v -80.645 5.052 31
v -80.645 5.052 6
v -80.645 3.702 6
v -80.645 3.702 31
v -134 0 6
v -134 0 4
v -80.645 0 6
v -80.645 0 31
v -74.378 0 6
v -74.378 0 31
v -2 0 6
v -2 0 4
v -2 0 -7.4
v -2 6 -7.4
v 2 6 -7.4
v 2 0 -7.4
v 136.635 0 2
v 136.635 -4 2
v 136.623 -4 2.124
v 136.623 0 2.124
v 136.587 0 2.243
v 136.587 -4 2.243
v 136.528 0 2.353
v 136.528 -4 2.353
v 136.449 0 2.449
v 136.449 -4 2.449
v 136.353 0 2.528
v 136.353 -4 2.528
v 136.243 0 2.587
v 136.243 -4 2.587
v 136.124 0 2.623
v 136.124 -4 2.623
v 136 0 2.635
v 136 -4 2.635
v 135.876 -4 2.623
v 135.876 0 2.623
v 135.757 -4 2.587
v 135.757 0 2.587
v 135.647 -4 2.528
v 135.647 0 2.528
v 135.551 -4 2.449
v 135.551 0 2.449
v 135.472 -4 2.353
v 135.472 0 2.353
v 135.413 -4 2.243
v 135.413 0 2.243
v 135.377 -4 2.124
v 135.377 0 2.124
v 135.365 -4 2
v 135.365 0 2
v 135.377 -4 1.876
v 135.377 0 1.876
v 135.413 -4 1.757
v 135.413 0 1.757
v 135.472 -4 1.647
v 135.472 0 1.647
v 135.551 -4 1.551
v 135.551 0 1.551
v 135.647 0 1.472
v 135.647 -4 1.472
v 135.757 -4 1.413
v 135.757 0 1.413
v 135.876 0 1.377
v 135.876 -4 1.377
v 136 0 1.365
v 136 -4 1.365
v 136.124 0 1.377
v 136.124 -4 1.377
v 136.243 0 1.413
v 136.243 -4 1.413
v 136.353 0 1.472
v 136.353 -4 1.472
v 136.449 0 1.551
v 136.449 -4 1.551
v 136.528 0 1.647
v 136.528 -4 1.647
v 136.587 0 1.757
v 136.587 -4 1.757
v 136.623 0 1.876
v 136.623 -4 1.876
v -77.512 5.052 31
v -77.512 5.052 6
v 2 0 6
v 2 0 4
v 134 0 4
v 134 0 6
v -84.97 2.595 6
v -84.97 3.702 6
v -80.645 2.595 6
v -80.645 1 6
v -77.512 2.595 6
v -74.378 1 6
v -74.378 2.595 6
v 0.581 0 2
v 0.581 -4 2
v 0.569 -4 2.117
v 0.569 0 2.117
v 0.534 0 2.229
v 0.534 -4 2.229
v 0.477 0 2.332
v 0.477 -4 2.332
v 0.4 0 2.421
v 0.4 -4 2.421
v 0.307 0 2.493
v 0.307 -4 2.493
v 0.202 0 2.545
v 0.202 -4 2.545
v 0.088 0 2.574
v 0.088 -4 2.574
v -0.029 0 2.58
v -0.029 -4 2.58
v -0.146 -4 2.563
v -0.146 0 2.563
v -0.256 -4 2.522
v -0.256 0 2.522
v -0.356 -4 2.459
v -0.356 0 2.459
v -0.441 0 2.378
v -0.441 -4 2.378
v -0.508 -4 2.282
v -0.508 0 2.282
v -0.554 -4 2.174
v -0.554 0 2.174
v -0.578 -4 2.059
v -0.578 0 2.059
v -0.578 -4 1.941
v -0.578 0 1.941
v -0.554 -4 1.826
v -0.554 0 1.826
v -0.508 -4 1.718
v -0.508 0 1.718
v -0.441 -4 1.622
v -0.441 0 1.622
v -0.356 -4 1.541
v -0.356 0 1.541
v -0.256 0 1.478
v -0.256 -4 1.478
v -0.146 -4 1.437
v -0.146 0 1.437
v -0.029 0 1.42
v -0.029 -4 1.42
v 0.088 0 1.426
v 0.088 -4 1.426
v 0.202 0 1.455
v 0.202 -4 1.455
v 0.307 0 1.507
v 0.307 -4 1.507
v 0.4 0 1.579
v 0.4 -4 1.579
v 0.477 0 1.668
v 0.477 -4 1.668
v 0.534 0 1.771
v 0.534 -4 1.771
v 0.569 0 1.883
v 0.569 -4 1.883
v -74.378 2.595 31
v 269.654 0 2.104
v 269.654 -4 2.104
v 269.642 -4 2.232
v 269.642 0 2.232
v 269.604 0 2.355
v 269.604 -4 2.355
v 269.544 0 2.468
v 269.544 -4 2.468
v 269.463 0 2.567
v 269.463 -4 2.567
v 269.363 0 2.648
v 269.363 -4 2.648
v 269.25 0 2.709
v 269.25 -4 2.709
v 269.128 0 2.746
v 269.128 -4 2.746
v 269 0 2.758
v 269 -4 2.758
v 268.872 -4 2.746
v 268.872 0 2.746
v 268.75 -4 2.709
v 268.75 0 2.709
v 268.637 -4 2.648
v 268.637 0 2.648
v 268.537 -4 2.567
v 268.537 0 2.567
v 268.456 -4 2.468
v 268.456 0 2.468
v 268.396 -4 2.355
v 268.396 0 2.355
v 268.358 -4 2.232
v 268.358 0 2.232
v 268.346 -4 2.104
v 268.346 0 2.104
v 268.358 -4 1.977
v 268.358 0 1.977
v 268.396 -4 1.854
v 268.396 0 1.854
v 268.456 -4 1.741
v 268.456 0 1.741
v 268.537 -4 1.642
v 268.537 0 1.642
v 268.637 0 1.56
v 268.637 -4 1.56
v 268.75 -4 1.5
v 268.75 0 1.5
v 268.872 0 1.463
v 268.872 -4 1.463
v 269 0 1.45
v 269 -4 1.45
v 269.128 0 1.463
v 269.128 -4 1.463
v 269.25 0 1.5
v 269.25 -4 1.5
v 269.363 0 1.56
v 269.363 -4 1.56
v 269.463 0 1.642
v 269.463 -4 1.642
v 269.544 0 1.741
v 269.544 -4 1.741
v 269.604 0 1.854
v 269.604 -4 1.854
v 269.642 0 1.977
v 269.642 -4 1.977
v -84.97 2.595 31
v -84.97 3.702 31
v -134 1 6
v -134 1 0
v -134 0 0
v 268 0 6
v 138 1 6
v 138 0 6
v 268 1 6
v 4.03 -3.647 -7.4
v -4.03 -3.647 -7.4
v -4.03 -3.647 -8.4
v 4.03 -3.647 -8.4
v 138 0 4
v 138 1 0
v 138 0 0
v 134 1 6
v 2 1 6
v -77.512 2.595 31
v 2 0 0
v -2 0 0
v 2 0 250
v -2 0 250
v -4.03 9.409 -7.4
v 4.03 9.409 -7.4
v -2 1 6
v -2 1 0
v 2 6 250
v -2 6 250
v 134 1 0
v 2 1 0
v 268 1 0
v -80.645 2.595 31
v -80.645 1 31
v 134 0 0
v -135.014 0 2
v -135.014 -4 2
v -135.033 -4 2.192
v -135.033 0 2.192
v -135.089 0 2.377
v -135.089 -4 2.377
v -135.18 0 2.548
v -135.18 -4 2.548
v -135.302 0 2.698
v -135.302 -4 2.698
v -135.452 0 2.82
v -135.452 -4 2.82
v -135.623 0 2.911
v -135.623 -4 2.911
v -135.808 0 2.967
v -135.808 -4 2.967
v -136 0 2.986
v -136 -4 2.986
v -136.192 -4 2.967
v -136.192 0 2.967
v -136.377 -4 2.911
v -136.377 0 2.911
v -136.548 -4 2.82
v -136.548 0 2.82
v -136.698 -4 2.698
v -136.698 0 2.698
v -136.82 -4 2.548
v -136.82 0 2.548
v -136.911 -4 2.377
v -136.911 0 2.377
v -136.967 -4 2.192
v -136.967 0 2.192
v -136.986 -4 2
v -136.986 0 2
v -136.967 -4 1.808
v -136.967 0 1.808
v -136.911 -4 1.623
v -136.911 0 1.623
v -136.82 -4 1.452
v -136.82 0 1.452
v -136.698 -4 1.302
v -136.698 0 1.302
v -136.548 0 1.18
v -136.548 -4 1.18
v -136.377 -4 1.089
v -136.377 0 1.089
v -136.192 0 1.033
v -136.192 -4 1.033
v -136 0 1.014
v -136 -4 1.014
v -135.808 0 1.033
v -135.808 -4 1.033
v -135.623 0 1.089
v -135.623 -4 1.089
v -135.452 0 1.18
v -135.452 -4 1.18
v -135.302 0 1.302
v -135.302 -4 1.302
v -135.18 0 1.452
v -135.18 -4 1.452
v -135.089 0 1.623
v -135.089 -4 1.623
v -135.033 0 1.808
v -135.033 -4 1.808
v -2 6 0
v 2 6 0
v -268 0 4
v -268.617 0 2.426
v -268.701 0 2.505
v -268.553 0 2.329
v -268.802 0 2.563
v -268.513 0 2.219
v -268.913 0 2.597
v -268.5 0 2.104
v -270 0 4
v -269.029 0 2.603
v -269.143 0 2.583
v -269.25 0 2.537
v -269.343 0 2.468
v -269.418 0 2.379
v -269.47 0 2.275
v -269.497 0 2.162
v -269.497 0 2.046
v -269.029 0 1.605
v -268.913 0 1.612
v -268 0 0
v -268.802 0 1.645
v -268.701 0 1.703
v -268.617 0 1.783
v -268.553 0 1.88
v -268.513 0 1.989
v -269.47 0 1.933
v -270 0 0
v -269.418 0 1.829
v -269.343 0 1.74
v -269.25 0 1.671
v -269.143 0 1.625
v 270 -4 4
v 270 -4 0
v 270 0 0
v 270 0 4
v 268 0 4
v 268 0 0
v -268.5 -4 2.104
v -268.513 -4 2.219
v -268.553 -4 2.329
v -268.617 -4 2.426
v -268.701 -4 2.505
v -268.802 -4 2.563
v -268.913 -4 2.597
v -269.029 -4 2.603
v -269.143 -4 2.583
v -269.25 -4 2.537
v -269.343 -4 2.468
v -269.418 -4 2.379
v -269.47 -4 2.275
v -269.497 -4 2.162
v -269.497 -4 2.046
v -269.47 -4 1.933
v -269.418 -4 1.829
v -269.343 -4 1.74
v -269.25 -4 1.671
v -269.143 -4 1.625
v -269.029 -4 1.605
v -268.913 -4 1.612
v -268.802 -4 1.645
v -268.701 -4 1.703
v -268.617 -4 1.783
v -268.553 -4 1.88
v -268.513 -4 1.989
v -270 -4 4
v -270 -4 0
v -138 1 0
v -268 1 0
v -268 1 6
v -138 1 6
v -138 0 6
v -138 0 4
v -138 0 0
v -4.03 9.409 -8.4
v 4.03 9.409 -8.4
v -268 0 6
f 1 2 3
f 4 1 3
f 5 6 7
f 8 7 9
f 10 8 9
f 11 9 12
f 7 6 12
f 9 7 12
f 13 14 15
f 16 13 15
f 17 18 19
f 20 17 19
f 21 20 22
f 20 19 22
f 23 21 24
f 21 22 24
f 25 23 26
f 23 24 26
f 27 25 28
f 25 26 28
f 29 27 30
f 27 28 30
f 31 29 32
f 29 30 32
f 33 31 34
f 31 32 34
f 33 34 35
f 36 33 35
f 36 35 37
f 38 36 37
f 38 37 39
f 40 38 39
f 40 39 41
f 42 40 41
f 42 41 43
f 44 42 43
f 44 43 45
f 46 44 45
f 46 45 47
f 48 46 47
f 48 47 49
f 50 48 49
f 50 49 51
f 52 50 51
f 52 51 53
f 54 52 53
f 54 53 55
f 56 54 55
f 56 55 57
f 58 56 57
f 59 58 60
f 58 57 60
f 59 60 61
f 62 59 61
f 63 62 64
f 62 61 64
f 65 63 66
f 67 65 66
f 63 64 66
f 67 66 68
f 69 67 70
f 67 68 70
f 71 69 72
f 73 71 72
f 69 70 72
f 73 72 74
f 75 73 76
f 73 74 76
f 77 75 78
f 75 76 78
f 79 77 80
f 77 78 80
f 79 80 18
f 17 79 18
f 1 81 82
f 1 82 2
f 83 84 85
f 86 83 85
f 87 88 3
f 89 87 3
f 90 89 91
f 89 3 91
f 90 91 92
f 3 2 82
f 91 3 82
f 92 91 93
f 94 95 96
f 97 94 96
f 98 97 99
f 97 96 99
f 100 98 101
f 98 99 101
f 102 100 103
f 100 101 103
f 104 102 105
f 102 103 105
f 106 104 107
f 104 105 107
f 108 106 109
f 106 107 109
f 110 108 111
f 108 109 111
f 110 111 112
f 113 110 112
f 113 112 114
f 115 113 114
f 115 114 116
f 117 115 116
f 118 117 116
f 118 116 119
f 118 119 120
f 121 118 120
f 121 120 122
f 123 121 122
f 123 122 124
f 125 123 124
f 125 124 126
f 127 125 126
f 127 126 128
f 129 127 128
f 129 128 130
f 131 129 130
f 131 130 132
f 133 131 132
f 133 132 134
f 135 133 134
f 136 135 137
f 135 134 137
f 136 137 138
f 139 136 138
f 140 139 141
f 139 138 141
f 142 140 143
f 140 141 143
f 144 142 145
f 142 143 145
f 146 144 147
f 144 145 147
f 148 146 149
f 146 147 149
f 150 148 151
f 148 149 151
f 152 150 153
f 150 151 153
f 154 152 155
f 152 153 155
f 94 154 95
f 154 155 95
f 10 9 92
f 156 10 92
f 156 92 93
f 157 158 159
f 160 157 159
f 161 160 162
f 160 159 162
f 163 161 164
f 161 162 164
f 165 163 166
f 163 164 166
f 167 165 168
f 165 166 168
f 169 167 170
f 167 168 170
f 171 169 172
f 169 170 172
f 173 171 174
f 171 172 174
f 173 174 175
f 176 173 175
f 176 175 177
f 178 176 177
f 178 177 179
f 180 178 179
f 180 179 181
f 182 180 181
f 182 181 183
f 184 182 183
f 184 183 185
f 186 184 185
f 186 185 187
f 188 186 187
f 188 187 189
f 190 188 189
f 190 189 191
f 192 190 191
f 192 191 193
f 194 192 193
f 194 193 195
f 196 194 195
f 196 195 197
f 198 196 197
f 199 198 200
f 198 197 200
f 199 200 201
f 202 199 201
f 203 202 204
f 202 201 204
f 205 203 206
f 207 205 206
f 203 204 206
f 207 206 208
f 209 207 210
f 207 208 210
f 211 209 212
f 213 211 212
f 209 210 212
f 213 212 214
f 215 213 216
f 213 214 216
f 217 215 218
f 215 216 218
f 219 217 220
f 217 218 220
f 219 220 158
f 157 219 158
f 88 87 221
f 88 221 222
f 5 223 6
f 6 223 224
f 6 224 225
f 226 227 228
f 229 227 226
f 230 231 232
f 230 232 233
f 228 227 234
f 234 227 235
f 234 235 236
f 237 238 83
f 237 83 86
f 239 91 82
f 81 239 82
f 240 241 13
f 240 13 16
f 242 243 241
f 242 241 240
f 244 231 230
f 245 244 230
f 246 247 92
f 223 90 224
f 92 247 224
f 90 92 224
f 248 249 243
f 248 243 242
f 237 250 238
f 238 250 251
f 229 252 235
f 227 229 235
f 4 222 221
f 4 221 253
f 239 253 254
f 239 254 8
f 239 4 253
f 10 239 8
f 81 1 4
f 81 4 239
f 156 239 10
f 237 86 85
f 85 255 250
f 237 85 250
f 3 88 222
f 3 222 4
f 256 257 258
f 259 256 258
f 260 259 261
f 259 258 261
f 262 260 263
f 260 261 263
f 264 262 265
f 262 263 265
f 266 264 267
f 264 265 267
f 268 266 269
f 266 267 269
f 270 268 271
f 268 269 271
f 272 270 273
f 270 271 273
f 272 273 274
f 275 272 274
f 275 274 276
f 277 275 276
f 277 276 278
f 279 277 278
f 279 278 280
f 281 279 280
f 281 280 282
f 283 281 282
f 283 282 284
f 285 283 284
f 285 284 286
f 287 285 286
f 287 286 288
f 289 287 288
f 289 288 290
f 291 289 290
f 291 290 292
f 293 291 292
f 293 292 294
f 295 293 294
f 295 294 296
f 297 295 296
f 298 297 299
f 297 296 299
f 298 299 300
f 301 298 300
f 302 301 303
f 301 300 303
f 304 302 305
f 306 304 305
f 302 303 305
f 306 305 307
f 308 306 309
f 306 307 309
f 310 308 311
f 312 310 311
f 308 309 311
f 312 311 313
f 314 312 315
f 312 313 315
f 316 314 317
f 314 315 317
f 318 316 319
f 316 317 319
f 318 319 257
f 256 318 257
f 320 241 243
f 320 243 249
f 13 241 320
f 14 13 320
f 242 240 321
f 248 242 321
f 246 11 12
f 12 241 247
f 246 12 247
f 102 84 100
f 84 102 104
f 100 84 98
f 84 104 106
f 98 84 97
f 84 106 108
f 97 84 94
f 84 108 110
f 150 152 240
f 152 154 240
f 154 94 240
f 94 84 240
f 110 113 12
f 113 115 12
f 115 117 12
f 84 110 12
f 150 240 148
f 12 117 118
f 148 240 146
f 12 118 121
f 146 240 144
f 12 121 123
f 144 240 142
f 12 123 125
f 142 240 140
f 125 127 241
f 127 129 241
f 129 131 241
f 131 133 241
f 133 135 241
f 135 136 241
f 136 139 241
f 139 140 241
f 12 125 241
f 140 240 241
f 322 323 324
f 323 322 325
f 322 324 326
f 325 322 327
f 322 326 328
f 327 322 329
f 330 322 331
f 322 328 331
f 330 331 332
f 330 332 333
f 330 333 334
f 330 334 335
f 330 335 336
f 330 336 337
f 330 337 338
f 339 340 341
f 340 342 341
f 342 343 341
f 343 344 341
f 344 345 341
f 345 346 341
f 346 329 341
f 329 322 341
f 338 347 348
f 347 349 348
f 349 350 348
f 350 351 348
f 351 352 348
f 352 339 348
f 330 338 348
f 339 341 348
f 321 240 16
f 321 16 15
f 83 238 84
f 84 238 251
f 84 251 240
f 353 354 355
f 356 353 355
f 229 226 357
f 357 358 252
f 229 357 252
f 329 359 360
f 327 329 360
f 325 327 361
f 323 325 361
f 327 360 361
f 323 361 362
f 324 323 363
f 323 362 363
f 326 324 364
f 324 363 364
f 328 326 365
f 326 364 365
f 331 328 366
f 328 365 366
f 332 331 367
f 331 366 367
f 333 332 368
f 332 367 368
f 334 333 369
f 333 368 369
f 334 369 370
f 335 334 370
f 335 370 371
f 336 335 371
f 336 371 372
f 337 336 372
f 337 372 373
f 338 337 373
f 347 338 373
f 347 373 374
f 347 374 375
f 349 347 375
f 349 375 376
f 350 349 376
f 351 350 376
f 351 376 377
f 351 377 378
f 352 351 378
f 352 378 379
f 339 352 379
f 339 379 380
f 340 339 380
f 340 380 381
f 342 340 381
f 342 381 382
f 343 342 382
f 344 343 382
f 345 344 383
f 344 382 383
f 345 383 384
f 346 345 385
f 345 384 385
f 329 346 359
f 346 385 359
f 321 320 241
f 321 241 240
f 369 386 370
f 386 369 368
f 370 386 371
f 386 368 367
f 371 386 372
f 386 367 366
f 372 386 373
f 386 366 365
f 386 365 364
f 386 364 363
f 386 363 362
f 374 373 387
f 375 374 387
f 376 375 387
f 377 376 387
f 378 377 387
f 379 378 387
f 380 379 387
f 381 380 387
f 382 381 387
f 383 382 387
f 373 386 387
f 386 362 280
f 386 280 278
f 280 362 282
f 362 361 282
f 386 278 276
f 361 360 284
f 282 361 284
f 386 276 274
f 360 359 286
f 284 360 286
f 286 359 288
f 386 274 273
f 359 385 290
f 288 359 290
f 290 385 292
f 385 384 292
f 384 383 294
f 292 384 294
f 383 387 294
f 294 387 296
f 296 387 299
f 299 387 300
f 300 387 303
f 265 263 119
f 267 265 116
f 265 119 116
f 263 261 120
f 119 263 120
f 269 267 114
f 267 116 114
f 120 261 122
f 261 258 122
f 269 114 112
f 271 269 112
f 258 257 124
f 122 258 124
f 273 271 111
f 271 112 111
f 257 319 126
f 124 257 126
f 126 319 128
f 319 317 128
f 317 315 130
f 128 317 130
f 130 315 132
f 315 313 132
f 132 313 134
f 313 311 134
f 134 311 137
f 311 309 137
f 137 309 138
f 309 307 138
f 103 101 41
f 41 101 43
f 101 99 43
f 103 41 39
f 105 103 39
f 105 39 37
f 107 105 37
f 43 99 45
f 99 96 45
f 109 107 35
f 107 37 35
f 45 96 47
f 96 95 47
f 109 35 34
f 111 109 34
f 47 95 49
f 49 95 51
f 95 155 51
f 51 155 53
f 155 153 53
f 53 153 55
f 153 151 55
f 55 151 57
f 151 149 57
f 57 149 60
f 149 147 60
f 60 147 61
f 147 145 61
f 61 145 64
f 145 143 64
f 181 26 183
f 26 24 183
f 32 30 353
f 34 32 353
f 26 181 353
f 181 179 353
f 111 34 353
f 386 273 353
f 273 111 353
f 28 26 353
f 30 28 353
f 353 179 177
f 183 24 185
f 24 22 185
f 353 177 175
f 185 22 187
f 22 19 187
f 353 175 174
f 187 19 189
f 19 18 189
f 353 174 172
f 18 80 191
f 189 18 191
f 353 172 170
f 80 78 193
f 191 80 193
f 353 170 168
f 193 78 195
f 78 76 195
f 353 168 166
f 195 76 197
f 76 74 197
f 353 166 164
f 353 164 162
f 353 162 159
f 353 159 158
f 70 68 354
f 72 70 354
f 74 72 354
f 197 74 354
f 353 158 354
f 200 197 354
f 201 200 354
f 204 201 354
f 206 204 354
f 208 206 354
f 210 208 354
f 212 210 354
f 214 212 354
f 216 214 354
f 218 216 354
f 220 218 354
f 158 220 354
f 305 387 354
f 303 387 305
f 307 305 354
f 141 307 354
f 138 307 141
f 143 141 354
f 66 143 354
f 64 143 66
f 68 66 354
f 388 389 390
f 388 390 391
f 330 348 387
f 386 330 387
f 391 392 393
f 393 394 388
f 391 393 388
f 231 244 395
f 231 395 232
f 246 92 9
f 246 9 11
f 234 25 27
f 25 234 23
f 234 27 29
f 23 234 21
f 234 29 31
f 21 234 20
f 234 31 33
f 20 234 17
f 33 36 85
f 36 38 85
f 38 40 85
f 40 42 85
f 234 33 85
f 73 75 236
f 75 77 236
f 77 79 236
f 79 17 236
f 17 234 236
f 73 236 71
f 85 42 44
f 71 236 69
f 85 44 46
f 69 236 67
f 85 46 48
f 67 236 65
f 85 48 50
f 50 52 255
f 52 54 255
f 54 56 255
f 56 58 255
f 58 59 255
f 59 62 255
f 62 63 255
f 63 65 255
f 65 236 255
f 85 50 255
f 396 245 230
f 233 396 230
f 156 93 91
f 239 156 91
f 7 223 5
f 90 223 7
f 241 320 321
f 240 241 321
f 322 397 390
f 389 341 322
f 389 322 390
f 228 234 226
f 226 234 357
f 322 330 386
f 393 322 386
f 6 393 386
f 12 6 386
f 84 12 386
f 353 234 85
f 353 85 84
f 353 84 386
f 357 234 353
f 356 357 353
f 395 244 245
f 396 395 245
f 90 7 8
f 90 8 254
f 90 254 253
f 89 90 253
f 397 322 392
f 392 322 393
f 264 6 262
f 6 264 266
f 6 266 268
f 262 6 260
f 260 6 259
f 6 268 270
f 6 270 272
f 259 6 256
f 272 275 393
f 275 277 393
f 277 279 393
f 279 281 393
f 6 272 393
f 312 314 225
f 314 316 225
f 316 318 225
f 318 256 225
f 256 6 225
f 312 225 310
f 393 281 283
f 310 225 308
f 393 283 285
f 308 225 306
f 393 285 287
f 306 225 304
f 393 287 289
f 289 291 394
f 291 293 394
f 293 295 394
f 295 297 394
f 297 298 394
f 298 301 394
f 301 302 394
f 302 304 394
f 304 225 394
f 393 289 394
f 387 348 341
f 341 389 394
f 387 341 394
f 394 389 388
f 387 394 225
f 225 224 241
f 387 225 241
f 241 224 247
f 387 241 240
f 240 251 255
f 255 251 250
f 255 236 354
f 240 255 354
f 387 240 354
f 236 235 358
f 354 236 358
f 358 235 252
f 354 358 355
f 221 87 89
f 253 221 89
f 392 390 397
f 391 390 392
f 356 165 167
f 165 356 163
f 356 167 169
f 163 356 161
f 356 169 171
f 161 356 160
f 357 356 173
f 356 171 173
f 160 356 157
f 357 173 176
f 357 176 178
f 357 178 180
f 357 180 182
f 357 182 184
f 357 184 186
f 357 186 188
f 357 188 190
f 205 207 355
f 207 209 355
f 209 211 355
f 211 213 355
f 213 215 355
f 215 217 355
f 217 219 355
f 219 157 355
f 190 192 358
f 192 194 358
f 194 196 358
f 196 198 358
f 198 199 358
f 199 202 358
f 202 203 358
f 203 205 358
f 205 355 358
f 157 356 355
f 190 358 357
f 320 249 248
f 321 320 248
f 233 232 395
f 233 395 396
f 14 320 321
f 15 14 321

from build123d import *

# Parameters (mm, degrees)
F1_DEPTH  = 4
F2_W      = 130
F2_H      = 1
F2_W_2    = 132
F3_DEPTH  = 2
F4_R      = 0.5
F4_R_2    = 0.9864532669
F4_R_3    = 0.58106253
F4_R_4    = 0.6541784485
F4_R_5    = 0.6351490428
F5_DEPTH  = 6.3
F6_W      = 4
F6_H      = 6
F7_DEPTH  = 250
F8_DEPTH  = 7.4
F9_W      = 8.0595696345
F9_H      = 13.0560852122
F9_W_2    = 4
F9_H_2    = 6
F10_DEPTH = 1
F11_W     = 3.1334906816
F11_H     = 1.5953846052
F11_W_2   = 4.3241381645
F11_H_2   = 1.1064866558
F12_DEPTH = 25


with BuildPart() as f1:
    # F0 (on Top) → F1 (new body)
    with BuildSketch(Plane.XY):
        Polygon((-268, 0), (-270, 0), (-270, -4), (270, -4), (270, 0), (268, 0), (268, 1), (138, 1), (138, 0), (134, 0), (134, 1), (2, 1), (2, 0), (-2, 0), (-2, 1), (-134, 1), (-134, 0), (-138, 0), (-138, 1), (-268, 1), align=None)
    extrude(amount=F1_DEPTH)

    # F2 (on face) → F3 (join)
    with BuildSketch(Plane.XY.offset(4)):
        with Locations((-203, 0.5)):
            Rectangle(F2_W, F2_H)
        with Locations((-68, 0.5)):
            Rectangle(F2_W_2, F2_H)
        with Locations((68, 0.5)):
            Rectangle(F2_W_2, F2_H)
        with Locations((203, 0.5)):
            Rectangle(F2_W, F2_H)
    extrude(amount=F3_DEPTH)

    # F4 (on face) → F5 (cut)
    with BuildSketch(Plane.XZ.offset(4)):
        with Locations((-269, 2.1041841583)):
            Circle(F4_R)
        with Locations((-136, 2)):
            Circle(F4_R_2)
        with Locations((0, 2)):
            Circle(F4_R_3)
        with Locations((269, 2.1041841583)):
            Circle(F4_R_4)
        with Locations((136, 2)):
            Circle(F4_R_5)
    extrude(amount=-F5_DEPTH, mode=Mode.SUBTRACT)

    # F11 (on face) → F12 (join)
    with BuildSketch(Plane.XY.offset(6)):
        Polygon((-74.3784606457, 0), (-74.3784606457, 2.5953846052), (-77.5119513273, 2.5953846052), (-77.5119513273, 1), (-80.645442009, 1), (-80.645442009, 0), align=None)
        with Locations((-79.0786966681, 1.7976923026)):
            Rectangle(F11_W, F11_H)
        Polygon((-80.645442009, 2.5953846052), (-77.5119513273, 2.5953846052), (-77.5119513273, 5.0517162308), (-80.645442009, 5.0517162308), (-80.645442009, 3.701871261), align=None)
        with Locations((-82.8075110912, 3.1486279331)):
            Rectangle(F11_W_2, F11_H_2)
    extrude(amount=F12_DEPTH)


with BuildPart() as f7:
    # F6 (on Top) → F7 (new body)
    with BuildSketch(Plane.XY):
        with Locations((0, 3)):
            Rectangle(F6_W, F6_H)
    extrude(amount=F7_DEPTH)


with BuildPart() as f8:
    # F6 (on Top) → F8 (new body)
    with BuildSketch(Plane.XY):
        with Locations((0, 3)):
            Rectangle(F6_W, F6_H)
    extrude(amount=-F8_DEPTH)


with BuildPart() as f10:
    # F9 (on face) → F10 (new body)
    with BuildSketch(Plane(origin=(0, 0, -7.4), x_dir=(1, 0, 0), z_dir=(0, 0, -1))):
        with Locations((0, -2.8808616335)):
            Rectangle(F9_W, F9_H)
        with Locations((0, -3)):
            Rectangle(F9_W_2, F9_H_2, mode=Mode.SUBTRACT)
        with Locations((0, -3)):
            Rectangle(F9_W_2, F9_H_2)
    extrude(amount=F10_DEPTH)


solid = Compound([f1.part, f7.part, f8.part, f10.part])
